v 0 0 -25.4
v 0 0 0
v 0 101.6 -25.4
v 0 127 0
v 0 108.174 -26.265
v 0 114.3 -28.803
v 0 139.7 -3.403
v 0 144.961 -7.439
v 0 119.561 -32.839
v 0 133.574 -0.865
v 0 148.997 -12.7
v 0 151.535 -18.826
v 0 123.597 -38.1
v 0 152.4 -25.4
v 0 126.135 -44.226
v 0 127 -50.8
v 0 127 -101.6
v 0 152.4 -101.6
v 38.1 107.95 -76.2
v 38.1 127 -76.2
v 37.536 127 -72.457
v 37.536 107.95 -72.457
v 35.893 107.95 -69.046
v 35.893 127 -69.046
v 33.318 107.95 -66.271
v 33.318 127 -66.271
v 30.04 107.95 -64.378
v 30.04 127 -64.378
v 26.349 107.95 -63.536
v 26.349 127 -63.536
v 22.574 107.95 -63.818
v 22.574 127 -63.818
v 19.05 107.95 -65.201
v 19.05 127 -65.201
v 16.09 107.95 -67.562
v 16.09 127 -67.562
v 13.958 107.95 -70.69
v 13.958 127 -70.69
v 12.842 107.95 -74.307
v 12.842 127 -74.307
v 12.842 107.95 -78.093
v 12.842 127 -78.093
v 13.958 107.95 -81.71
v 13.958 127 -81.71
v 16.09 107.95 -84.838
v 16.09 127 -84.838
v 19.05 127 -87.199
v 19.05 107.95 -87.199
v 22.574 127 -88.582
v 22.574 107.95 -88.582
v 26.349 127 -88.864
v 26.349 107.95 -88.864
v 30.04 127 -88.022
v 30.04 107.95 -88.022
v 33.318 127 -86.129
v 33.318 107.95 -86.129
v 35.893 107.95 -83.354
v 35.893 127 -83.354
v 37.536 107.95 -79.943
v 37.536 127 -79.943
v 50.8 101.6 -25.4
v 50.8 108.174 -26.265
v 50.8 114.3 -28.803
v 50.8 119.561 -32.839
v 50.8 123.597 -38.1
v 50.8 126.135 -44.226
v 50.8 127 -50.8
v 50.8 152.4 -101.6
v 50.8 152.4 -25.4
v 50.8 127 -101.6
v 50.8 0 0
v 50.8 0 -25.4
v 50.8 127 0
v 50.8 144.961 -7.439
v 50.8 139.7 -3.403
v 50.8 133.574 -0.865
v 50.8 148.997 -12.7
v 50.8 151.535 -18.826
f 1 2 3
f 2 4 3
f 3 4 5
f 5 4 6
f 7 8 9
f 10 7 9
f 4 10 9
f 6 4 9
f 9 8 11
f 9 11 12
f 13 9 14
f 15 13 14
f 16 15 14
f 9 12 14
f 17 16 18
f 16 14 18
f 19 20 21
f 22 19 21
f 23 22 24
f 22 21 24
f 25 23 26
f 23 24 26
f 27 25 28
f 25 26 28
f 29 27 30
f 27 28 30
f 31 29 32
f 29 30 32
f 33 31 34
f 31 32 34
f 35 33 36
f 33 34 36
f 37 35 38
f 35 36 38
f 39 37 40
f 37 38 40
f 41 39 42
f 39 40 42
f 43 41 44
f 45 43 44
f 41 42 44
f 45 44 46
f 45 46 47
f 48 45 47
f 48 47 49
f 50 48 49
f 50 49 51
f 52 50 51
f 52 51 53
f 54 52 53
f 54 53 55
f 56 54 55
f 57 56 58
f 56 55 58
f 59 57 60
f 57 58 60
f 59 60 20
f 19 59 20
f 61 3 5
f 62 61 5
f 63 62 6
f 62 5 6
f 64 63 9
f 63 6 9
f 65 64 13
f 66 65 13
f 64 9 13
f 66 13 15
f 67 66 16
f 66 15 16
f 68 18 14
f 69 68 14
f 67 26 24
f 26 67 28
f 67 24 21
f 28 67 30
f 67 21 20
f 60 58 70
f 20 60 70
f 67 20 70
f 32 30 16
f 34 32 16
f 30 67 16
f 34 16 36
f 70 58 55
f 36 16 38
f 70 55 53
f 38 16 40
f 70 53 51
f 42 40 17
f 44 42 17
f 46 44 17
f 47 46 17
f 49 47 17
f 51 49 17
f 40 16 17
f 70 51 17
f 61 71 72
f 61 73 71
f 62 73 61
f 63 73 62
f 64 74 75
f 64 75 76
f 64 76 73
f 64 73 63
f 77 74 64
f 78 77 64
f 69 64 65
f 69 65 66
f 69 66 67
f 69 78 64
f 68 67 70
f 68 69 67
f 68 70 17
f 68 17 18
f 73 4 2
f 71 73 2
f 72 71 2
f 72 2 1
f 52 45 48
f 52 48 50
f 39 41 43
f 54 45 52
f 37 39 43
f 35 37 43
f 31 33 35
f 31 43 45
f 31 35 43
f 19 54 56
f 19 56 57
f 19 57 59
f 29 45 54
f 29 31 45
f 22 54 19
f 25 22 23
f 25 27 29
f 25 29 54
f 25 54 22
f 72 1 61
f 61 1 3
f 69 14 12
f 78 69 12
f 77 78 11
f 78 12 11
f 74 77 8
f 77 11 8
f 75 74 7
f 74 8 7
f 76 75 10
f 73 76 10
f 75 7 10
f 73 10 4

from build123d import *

# Parameters (mm, degrees)
SALIENTE_EXTRUIR1_DEPTH = 50.8
CROQUIS2_R              = 12.7
SALIENTE_EXTRUIR2_DEPTH = 19.05


with BuildPart() as part:
    # Croquis1 → Saliente-Extruir1 (new body)
    with BuildSketch(Plane(origin=(0, 0, 0), x_dir=(0, 0, -1), z_dir=(1, 0, 0))):
        with BuildLine():
            Line((0, 0), (25.4, 0))
            Line((25.4, 0), (25.4, 101.6))
            ThreePointArc((25.4, 101.6), (32.839487758, 119.560512242), (50.8, 127))
            Line((50.8, 127), (101.6, 127))
            Line((101.6, 127), (101.6, 152.4))
            Line((101.6, 152.4), (25.4, 152.4))
            ThreePointArc((25.4, 152.4), (7.439487758, 144.960512242), (0, 127))
            Line((0, 127), (0, 0))
        make_face()
    extrude(amount=SALIENTE_EXTRUIR1_DEPTH)

    # Croquis2 → Saliente-Extruir2 (add)
    with BuildSketch(Plane.XZ.offset(-127)):
        with Locations((25.4, -76.2)):
            Circle(CROQUIS2_R)
    extrude(amount=SALIENTE_EXTRUIR2_DEPTH)


solid = part.part
